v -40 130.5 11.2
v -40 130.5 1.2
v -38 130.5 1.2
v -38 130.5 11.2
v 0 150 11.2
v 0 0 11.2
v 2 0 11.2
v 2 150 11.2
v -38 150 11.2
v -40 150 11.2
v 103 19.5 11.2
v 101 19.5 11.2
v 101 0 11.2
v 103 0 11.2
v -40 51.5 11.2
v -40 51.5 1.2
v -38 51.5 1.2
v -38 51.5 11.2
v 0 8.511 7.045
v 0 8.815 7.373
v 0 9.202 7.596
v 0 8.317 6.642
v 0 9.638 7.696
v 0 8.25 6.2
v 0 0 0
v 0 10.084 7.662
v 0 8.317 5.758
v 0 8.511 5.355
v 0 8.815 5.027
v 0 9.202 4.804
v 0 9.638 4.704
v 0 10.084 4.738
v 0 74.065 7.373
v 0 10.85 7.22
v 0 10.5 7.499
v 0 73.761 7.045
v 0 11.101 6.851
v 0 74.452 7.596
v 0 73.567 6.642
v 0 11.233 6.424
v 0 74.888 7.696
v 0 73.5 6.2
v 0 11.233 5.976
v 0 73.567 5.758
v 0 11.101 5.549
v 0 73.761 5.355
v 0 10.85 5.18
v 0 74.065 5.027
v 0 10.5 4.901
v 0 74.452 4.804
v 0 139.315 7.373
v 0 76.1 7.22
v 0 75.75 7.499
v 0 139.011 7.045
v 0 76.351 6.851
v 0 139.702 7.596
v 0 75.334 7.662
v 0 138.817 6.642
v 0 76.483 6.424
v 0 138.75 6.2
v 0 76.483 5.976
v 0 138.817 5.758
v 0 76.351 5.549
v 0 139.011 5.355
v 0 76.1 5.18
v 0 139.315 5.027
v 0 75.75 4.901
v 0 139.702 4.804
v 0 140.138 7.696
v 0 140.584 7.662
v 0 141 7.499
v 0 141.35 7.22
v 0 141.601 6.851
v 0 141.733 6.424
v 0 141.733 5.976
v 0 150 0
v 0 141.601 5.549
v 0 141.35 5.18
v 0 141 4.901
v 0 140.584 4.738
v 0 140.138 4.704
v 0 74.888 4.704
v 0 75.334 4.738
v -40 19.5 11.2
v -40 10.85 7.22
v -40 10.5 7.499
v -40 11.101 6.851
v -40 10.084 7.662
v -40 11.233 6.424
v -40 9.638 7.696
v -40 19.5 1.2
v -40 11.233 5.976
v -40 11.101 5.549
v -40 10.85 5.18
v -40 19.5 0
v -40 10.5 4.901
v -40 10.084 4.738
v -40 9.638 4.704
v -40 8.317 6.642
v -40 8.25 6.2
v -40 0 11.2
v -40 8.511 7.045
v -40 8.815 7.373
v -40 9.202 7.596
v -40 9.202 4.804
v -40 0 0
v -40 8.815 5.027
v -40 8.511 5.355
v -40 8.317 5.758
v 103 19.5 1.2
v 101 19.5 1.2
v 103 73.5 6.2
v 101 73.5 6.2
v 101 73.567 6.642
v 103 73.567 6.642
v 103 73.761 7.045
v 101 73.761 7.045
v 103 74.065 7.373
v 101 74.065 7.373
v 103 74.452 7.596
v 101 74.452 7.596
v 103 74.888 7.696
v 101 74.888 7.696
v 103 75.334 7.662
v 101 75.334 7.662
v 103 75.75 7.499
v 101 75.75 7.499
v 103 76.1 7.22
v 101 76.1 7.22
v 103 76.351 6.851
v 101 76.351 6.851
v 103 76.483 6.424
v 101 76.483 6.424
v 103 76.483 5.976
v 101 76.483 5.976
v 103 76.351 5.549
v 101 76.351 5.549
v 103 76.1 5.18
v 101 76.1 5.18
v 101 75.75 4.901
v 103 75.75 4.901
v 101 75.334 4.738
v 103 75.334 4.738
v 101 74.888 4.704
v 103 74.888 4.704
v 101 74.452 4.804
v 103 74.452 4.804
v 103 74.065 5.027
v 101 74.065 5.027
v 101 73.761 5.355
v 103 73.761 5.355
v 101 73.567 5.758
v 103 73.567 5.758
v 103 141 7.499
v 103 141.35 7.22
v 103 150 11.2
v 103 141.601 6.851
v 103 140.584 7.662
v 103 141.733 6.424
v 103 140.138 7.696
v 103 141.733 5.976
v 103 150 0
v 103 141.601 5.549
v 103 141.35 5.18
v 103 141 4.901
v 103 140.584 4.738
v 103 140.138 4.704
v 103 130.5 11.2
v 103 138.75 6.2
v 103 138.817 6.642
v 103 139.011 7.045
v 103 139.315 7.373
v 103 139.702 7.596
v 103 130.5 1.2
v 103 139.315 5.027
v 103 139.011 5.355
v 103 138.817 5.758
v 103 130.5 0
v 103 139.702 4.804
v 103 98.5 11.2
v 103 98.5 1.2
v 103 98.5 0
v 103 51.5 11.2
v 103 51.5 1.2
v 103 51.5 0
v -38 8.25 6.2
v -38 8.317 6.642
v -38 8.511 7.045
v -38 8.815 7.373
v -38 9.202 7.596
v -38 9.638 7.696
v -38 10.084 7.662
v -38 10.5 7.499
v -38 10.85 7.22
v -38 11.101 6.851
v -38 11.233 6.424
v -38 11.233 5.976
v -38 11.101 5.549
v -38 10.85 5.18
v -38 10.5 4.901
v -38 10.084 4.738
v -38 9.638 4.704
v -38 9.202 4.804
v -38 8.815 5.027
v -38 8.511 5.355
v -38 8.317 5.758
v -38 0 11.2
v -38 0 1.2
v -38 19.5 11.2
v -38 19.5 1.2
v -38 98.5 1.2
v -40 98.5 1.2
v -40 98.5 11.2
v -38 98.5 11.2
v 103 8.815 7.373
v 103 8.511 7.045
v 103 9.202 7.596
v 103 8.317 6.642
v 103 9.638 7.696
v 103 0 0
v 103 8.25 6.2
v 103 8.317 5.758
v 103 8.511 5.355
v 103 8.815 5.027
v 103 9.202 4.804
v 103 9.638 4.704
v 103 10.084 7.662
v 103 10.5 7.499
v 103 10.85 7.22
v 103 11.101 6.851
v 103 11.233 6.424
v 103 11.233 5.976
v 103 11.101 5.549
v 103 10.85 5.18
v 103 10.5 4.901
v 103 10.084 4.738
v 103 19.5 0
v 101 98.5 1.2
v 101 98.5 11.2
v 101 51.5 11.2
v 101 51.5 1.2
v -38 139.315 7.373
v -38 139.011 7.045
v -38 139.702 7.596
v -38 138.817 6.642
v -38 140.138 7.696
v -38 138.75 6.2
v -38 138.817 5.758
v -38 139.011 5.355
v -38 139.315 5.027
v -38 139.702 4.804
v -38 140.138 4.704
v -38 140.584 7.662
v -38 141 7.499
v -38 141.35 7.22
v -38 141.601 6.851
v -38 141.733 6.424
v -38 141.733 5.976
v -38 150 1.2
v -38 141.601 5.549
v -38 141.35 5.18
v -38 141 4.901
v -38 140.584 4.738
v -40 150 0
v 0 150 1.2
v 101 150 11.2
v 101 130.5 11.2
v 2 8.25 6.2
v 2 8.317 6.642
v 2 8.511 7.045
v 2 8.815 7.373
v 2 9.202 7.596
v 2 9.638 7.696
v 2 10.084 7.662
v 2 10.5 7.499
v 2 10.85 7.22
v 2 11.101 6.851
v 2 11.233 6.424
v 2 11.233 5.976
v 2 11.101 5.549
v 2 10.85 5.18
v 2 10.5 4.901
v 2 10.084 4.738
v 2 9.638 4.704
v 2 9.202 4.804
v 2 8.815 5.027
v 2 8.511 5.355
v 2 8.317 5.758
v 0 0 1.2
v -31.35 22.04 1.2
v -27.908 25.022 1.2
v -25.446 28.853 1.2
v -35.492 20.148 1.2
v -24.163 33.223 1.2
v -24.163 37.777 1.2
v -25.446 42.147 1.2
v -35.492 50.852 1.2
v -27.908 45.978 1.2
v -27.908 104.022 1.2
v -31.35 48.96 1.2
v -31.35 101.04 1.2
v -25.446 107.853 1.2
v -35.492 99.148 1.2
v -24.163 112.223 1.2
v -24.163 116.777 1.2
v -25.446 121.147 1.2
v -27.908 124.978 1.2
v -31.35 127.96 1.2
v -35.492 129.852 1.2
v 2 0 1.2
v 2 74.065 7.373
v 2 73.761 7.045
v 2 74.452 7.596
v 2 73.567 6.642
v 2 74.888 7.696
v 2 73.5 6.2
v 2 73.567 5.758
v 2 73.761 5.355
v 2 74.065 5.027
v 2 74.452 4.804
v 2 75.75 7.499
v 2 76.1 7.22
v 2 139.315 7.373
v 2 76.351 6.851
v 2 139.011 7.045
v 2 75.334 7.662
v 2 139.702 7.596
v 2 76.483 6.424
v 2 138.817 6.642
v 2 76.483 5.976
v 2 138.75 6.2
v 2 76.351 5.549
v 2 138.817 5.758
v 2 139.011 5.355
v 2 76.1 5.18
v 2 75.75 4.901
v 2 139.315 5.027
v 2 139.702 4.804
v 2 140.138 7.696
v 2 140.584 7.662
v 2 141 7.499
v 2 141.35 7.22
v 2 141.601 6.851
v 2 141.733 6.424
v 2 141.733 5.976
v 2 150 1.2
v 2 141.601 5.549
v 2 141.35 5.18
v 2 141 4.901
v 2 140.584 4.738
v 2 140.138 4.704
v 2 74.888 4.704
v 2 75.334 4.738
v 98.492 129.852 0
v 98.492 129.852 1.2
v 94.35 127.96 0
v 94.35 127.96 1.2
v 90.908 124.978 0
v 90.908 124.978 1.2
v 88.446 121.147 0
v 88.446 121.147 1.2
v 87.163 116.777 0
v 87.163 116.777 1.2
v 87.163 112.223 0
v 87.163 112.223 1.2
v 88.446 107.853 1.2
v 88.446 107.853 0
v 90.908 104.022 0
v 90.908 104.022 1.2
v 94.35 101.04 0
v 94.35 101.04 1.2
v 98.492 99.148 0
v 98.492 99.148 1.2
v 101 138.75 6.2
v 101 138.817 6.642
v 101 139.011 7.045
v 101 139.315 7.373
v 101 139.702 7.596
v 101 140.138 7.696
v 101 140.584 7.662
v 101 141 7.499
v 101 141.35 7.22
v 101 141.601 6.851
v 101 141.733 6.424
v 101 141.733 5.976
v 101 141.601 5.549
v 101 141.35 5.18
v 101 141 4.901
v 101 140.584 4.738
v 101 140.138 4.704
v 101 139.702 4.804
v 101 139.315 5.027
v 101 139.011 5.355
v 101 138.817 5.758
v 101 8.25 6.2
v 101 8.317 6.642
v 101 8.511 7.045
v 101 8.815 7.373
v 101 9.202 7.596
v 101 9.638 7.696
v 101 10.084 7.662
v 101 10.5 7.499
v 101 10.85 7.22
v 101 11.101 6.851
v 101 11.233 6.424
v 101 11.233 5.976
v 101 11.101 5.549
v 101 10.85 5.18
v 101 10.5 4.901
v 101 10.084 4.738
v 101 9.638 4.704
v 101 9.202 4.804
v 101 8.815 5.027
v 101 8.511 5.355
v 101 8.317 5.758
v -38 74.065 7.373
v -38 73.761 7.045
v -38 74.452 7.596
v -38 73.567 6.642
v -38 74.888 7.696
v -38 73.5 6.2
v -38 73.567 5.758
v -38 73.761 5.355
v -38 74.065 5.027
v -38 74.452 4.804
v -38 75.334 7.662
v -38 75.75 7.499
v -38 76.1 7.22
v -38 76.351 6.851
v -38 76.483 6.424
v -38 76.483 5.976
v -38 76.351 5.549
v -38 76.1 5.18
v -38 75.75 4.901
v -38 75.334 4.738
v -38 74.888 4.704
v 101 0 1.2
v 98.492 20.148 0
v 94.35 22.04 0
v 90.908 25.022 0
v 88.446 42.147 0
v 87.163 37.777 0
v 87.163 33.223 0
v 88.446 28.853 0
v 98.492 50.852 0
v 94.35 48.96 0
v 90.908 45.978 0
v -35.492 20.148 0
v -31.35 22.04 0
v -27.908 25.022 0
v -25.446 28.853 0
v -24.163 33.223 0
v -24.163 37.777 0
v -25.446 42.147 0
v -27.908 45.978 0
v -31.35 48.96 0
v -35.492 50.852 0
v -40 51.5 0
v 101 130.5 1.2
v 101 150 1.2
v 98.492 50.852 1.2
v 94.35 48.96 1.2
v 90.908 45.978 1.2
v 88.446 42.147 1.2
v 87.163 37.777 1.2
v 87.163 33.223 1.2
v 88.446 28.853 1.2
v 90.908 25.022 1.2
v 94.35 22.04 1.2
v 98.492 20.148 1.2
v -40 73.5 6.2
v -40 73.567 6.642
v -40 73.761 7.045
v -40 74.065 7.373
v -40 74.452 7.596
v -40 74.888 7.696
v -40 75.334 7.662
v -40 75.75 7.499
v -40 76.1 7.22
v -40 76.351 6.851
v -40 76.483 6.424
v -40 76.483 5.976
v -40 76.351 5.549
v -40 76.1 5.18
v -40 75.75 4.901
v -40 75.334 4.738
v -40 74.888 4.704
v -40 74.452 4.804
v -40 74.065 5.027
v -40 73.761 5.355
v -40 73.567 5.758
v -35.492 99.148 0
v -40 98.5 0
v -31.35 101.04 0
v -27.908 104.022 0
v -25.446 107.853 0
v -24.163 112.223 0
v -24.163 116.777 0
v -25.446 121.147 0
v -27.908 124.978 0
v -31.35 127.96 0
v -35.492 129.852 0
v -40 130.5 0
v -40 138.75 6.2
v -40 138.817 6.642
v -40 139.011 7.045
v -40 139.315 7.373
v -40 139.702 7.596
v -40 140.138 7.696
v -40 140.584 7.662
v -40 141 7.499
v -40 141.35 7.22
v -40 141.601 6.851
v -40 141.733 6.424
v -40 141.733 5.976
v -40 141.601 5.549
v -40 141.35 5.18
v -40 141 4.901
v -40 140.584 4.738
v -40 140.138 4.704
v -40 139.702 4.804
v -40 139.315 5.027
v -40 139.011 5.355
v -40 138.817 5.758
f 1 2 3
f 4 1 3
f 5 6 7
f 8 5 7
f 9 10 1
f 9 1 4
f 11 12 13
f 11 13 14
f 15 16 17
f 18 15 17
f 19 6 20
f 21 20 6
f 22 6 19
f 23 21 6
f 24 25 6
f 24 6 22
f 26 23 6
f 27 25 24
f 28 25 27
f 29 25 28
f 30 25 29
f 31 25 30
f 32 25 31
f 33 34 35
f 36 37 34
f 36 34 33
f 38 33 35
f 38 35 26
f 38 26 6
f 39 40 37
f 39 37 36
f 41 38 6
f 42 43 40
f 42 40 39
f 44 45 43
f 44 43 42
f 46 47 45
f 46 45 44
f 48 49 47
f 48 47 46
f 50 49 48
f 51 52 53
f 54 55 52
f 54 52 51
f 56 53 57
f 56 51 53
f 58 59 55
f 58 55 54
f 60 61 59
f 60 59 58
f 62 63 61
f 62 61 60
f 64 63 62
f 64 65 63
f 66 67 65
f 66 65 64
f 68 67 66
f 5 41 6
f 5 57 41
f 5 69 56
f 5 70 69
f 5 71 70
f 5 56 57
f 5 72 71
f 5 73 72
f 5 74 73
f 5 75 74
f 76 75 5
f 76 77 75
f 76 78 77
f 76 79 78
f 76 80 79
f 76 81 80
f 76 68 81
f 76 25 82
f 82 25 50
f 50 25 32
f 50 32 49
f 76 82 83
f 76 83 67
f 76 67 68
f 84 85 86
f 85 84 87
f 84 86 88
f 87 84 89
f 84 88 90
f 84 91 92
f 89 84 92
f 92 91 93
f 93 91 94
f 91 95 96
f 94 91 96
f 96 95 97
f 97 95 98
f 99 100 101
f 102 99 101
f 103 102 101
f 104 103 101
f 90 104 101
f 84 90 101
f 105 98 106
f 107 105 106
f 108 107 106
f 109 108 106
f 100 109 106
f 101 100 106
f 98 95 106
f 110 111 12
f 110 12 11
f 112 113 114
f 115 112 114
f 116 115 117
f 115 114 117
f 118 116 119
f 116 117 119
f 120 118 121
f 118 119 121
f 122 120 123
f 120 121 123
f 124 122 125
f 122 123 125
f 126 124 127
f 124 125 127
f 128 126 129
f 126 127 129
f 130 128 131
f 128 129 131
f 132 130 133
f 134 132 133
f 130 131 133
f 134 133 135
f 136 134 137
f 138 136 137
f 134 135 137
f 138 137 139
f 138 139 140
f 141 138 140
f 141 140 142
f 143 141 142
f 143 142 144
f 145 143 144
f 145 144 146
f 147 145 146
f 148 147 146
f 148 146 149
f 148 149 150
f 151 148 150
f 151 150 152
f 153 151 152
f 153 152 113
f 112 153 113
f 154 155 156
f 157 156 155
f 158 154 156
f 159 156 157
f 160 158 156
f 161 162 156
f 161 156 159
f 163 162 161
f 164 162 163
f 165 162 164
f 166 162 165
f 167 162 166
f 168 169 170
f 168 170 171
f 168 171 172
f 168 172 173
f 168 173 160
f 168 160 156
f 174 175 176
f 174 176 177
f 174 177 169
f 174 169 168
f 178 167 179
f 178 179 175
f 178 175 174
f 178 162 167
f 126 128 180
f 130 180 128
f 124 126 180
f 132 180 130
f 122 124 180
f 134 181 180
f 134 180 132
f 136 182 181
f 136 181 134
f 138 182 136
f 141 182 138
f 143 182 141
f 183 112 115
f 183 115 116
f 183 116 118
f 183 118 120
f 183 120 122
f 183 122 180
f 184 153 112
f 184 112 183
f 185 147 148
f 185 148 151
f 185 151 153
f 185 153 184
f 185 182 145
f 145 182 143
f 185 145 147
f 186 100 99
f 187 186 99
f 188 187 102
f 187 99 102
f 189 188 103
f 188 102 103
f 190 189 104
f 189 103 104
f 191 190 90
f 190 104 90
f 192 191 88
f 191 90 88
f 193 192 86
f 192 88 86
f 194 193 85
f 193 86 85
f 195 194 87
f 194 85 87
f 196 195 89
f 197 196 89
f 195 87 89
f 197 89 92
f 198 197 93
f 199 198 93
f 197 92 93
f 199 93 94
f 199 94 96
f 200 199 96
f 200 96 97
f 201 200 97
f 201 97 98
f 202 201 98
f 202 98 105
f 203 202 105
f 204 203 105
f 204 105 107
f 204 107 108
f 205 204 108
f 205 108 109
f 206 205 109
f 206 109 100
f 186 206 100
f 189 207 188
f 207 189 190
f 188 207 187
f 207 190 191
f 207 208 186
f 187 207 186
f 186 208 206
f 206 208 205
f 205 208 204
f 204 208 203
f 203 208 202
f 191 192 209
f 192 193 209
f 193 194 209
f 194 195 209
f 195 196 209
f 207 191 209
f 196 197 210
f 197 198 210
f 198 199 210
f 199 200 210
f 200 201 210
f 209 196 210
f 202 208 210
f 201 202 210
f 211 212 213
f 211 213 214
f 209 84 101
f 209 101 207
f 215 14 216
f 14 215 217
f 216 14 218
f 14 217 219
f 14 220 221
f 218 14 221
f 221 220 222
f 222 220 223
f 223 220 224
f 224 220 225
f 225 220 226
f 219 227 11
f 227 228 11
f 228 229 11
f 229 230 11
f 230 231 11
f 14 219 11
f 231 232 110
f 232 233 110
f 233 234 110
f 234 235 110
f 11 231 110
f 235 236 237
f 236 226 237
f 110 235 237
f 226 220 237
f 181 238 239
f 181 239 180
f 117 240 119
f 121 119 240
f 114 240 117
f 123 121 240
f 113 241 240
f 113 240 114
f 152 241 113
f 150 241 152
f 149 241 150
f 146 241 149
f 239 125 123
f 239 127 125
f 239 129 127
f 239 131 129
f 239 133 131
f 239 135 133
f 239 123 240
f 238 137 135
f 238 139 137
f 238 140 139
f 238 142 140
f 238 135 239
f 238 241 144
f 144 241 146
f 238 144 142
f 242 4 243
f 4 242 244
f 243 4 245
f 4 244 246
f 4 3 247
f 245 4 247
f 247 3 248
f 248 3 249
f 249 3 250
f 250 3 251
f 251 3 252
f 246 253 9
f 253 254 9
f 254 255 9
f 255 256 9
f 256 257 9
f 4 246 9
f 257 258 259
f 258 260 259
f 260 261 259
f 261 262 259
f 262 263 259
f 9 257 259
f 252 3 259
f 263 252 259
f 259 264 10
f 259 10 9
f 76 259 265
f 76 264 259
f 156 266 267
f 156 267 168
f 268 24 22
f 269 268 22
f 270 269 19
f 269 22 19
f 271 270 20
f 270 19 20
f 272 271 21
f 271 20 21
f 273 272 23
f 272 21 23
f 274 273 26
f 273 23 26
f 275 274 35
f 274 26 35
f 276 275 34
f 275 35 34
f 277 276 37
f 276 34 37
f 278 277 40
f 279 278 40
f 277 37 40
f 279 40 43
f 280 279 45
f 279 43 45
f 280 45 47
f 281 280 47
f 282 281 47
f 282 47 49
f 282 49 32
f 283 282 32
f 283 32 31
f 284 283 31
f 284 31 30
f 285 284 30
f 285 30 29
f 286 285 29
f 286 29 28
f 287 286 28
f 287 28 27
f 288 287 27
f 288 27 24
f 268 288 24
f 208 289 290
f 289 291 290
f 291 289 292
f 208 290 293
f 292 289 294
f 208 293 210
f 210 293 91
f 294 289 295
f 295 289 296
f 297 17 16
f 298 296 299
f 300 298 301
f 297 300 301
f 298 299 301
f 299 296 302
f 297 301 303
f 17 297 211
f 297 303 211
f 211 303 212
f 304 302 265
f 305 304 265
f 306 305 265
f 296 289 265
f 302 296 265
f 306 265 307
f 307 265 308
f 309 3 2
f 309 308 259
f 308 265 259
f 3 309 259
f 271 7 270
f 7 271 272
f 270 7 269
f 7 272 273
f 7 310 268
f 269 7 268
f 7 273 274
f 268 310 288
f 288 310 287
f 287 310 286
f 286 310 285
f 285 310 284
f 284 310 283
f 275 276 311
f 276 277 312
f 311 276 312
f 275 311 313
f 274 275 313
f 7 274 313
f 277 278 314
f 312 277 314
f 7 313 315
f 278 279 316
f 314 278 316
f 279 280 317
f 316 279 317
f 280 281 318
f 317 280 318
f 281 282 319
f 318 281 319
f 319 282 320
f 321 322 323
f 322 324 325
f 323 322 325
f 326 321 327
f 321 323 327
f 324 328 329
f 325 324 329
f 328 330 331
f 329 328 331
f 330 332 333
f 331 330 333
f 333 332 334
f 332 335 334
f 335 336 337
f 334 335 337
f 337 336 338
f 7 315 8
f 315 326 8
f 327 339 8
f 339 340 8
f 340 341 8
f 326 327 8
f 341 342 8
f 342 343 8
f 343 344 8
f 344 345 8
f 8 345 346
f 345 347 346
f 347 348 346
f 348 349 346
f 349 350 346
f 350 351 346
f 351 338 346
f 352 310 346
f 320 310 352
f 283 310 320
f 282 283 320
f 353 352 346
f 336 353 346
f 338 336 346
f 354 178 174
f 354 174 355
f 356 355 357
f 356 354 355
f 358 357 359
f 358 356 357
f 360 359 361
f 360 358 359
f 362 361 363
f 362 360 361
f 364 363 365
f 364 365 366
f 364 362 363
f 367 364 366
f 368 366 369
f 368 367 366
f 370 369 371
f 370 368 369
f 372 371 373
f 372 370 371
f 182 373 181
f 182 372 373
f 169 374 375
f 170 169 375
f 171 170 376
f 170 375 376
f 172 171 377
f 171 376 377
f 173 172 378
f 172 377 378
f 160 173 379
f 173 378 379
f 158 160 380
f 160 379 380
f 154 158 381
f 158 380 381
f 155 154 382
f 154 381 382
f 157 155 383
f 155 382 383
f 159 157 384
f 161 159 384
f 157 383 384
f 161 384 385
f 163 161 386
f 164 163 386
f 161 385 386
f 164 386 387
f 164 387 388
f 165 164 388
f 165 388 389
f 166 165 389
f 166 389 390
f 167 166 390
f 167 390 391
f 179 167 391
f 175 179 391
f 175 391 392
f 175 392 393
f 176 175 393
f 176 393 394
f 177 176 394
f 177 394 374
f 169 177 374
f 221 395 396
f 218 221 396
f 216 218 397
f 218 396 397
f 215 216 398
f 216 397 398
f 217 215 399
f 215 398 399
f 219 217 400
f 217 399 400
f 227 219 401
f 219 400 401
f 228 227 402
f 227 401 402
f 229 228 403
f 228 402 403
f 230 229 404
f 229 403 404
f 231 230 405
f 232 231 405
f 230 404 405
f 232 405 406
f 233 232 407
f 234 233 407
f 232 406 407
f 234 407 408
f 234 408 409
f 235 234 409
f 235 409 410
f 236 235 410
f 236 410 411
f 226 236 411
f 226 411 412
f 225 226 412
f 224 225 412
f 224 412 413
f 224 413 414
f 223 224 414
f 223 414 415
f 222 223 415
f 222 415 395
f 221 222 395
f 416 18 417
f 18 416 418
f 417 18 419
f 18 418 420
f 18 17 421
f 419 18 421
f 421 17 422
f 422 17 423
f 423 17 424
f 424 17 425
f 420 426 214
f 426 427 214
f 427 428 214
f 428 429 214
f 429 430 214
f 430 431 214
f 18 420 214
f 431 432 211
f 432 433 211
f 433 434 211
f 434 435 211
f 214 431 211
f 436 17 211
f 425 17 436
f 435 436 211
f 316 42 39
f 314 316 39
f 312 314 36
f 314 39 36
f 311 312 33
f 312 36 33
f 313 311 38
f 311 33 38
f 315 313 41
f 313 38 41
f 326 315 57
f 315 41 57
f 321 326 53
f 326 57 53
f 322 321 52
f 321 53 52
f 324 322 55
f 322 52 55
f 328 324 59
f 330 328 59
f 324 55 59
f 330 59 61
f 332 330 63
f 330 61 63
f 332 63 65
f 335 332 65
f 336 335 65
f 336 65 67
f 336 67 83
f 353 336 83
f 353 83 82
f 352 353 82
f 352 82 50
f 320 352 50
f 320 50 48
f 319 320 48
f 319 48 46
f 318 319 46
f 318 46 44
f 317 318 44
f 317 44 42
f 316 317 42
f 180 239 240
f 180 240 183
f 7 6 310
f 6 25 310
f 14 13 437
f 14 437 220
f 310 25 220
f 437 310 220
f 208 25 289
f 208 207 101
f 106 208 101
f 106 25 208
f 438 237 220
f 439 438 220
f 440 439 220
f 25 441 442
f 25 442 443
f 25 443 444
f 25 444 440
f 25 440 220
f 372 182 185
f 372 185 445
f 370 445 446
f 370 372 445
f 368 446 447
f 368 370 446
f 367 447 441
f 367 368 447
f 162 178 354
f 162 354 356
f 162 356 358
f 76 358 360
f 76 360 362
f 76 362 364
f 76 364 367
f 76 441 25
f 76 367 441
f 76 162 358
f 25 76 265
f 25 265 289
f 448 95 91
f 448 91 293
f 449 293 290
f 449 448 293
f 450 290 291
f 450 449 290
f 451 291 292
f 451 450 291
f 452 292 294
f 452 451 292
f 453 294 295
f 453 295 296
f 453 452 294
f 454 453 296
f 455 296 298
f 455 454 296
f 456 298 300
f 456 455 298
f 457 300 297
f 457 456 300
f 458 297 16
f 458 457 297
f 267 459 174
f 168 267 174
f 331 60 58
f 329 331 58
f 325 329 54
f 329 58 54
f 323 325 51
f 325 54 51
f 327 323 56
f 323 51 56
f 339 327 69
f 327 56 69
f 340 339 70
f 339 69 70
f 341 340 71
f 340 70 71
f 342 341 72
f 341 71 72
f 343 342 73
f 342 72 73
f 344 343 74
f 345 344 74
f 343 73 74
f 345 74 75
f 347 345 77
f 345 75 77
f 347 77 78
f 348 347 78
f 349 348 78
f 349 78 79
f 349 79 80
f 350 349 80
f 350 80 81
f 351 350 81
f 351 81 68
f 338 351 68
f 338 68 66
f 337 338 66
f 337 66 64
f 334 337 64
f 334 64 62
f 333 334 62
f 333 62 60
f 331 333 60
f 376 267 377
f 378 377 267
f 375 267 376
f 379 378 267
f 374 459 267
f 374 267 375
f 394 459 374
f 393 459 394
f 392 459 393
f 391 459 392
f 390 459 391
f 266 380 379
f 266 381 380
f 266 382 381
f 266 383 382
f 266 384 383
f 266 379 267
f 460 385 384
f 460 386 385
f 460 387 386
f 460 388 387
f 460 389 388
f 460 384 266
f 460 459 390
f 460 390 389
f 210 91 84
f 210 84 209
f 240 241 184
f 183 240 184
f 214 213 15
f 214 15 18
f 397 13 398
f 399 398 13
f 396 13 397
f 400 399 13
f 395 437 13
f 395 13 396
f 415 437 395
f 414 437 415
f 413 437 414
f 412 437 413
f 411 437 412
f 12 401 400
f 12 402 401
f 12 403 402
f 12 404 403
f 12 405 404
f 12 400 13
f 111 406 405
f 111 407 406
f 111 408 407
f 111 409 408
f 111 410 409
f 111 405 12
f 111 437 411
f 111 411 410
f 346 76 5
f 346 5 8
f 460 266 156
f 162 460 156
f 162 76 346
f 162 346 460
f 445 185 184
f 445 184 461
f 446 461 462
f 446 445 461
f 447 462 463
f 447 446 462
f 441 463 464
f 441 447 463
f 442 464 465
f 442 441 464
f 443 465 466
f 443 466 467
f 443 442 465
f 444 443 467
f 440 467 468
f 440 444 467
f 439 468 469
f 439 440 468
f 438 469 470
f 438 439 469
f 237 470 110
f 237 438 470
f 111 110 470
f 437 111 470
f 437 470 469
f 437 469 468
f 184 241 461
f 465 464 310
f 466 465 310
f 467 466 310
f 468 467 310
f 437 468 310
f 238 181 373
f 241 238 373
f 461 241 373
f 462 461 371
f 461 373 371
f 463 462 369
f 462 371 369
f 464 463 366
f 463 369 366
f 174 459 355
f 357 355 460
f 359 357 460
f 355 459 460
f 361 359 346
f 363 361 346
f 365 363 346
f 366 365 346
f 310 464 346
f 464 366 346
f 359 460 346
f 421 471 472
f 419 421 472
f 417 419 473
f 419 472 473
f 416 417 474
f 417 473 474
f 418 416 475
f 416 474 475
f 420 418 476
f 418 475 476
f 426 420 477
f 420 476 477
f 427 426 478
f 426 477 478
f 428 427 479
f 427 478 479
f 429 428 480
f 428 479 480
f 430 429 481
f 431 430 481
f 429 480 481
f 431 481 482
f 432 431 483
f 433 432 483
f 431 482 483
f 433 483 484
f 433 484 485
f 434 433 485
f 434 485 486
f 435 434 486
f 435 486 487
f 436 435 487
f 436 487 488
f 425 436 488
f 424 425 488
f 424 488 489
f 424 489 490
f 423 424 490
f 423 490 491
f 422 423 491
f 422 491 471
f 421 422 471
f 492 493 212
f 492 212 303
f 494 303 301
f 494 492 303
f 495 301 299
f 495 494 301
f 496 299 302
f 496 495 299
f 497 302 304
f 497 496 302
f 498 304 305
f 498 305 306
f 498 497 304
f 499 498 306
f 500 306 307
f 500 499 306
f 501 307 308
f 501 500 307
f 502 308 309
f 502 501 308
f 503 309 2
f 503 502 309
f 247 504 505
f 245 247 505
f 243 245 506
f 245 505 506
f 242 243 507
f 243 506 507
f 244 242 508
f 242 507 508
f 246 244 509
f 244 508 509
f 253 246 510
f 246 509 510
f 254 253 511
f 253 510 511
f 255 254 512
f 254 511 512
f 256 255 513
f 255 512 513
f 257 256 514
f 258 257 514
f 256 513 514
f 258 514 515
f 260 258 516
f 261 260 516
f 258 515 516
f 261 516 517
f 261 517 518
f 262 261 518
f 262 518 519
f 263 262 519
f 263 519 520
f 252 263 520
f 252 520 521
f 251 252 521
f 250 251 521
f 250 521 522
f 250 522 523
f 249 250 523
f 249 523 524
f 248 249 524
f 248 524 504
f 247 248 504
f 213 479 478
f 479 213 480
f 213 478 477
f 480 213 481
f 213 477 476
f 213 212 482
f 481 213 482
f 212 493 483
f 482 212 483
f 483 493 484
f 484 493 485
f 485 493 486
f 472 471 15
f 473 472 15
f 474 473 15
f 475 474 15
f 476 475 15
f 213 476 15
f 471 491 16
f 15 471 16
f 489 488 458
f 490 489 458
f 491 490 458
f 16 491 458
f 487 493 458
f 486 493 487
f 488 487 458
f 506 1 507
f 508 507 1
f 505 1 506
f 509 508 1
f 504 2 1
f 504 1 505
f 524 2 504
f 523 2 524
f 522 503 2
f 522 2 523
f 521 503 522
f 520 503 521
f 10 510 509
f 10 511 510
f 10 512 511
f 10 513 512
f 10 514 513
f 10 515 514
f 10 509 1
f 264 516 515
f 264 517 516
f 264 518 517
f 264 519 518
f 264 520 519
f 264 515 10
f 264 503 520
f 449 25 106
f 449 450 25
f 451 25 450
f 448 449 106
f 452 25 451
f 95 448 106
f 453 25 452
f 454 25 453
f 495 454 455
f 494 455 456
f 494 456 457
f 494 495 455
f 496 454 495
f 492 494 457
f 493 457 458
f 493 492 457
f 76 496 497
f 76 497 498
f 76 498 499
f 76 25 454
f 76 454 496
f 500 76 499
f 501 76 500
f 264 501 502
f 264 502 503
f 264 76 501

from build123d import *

# Parameters (mm, degrees)
PAD_DEPTH       = 1.2
SKETCH001_W     = 2
SKETCH001_H     = 150
SKETCH001_H_2   = 19.5
SKETCH001_H_3   = 47
PAD001_DEPTH    = 10
SKETCH002_R     = 1.5
POCKET_DEPTH    = 103.001
PAD002_DEPTH    = 1.2
SKETCH004_W     = 2
SKETCH004_H     = 19.5
SKETCH004_H_2   = 47
PAD003_DEPTH    = 10
SKETCH005_R     = 1.5
POCKET001_DEPTH = 40.001


with BuildPart() as left:
    # Sketch → Pad (new body)
    with BuildSketch(Plane.XY):
        with BuildLine():
            Line((0, 0), (0, 150))
            Line((0, 150), (103, 150))
            Line((103, 150), (103, 130.5))
            ThreePointArc((103, 130.5), (87, 114.5), (103, 98.5))
            Line((103, 98.5), (103, 51.5))
            ThreePointArc((103, 51.5), (87, 35.5), (103, 19.5))
            Line((103, 0), (103, 19.5))
            Line((0, 0), (103, 0))
        make_face()
    extrude(amount=PAD_DEPTH)

    # Sketch001 (on Face10 of Pad) → Pad001 (join)
    with BuildSketch(Plane.XY.offset(1.2)):
        with Locations((1, 75)):
            Rectangle(SKETCH001_W, SKETCH001_H)
        with Locations((102, 140.25)):
            Rectangle(SKETCH001_W, SKETCH001_H_2)
        with Locations((102, 75)):
            Rectangle(SKETCH001_W, SKETCH001_H_3)
        with Locations((102, 9.75)):
            Rectangle(SKETCH001_W, SKETCH001_H_2)
    extrude(amount=PAD001_DEPTH)

    # Sketch002 (on Face5 of Pad001) → Pocket (cut, through all)
    with BuildSketch(Plane(origin=(0, 0, 0), x_dir=(0, -1, 0), z_dir=(-1, 0, 0))):
        with Locations((-75, 6.2)):
            Circle(SKETCH002_R)
        with Locations((-140.25, 6.2)):
            Circle(SKETCH002_R)
        with Locations((-9.75, 6.2)):
            Circle(SKETCH002_R)
    extrude(amount=-POCKET_DEPTH, mode=Mode.SUBTRACT)


with BuildPart() as right:
    # Sketch003 → Pad002 (new body)
    with BuildSketch(Plane.XY):
        with BuildLine():
            Line((0, 0), (-40, 0))
            Line((-40, 19.5), (-40, 0))
            ThreePointArc((-40, 19.5), (-24, 35.5), (-40, 51.5))
            Line((-40, 98.5), (-40, 51.5))
            ThreePointArc((-40, 98.5), (-24, 114.5), (-40, 130.5))
            Line((-40, 130.5), (-40, 150))
            Line((-40, 150), (0, 150))
            Line((0, 150), (0, 0))
        make_face()
    extrude(amount=PAD002_DEPTH)

    # Sketch004 (on Face10 of Pad002) → Pad003 (join)
    with BuildSketch(Plane.XY.offset(1.2)):
        with Locations((-39, 140.25)):
            Rectangle(SKETCH004_W, SKETCH004_H)
        with Locations((-39, 75)):
            Rectangle(SKETCH004_W, SKETCH004_H_2)
        with Locations((-39, 9.75)):
            Rectangle(SKETCH004_W, SKETCH004_H)
    extrude(amount=PAD003_DEPTH)

    # Sketch005 (on Face7 of Pad003) → Pocket001 (cut, through all)
    with BuildSketch(Plane(origin=(-40, 0, 0), x_dir=(0, -1, 0), z_dir=(-1, 0, 0))):
        with Locations((-140.25, 6.2)):
            Circle(SKETCH005_R)
        with Locations((-75, 6.2)):
            Circle(SKETCH005_R)
        with Locations((-9.75, 6.2)):
            Circle(SKETCH005_R)
    extrude(amount=-POCKET001_DEPTH, mode=Mode.SUBTRACT)


solid = Compound([left.part, right.part])
